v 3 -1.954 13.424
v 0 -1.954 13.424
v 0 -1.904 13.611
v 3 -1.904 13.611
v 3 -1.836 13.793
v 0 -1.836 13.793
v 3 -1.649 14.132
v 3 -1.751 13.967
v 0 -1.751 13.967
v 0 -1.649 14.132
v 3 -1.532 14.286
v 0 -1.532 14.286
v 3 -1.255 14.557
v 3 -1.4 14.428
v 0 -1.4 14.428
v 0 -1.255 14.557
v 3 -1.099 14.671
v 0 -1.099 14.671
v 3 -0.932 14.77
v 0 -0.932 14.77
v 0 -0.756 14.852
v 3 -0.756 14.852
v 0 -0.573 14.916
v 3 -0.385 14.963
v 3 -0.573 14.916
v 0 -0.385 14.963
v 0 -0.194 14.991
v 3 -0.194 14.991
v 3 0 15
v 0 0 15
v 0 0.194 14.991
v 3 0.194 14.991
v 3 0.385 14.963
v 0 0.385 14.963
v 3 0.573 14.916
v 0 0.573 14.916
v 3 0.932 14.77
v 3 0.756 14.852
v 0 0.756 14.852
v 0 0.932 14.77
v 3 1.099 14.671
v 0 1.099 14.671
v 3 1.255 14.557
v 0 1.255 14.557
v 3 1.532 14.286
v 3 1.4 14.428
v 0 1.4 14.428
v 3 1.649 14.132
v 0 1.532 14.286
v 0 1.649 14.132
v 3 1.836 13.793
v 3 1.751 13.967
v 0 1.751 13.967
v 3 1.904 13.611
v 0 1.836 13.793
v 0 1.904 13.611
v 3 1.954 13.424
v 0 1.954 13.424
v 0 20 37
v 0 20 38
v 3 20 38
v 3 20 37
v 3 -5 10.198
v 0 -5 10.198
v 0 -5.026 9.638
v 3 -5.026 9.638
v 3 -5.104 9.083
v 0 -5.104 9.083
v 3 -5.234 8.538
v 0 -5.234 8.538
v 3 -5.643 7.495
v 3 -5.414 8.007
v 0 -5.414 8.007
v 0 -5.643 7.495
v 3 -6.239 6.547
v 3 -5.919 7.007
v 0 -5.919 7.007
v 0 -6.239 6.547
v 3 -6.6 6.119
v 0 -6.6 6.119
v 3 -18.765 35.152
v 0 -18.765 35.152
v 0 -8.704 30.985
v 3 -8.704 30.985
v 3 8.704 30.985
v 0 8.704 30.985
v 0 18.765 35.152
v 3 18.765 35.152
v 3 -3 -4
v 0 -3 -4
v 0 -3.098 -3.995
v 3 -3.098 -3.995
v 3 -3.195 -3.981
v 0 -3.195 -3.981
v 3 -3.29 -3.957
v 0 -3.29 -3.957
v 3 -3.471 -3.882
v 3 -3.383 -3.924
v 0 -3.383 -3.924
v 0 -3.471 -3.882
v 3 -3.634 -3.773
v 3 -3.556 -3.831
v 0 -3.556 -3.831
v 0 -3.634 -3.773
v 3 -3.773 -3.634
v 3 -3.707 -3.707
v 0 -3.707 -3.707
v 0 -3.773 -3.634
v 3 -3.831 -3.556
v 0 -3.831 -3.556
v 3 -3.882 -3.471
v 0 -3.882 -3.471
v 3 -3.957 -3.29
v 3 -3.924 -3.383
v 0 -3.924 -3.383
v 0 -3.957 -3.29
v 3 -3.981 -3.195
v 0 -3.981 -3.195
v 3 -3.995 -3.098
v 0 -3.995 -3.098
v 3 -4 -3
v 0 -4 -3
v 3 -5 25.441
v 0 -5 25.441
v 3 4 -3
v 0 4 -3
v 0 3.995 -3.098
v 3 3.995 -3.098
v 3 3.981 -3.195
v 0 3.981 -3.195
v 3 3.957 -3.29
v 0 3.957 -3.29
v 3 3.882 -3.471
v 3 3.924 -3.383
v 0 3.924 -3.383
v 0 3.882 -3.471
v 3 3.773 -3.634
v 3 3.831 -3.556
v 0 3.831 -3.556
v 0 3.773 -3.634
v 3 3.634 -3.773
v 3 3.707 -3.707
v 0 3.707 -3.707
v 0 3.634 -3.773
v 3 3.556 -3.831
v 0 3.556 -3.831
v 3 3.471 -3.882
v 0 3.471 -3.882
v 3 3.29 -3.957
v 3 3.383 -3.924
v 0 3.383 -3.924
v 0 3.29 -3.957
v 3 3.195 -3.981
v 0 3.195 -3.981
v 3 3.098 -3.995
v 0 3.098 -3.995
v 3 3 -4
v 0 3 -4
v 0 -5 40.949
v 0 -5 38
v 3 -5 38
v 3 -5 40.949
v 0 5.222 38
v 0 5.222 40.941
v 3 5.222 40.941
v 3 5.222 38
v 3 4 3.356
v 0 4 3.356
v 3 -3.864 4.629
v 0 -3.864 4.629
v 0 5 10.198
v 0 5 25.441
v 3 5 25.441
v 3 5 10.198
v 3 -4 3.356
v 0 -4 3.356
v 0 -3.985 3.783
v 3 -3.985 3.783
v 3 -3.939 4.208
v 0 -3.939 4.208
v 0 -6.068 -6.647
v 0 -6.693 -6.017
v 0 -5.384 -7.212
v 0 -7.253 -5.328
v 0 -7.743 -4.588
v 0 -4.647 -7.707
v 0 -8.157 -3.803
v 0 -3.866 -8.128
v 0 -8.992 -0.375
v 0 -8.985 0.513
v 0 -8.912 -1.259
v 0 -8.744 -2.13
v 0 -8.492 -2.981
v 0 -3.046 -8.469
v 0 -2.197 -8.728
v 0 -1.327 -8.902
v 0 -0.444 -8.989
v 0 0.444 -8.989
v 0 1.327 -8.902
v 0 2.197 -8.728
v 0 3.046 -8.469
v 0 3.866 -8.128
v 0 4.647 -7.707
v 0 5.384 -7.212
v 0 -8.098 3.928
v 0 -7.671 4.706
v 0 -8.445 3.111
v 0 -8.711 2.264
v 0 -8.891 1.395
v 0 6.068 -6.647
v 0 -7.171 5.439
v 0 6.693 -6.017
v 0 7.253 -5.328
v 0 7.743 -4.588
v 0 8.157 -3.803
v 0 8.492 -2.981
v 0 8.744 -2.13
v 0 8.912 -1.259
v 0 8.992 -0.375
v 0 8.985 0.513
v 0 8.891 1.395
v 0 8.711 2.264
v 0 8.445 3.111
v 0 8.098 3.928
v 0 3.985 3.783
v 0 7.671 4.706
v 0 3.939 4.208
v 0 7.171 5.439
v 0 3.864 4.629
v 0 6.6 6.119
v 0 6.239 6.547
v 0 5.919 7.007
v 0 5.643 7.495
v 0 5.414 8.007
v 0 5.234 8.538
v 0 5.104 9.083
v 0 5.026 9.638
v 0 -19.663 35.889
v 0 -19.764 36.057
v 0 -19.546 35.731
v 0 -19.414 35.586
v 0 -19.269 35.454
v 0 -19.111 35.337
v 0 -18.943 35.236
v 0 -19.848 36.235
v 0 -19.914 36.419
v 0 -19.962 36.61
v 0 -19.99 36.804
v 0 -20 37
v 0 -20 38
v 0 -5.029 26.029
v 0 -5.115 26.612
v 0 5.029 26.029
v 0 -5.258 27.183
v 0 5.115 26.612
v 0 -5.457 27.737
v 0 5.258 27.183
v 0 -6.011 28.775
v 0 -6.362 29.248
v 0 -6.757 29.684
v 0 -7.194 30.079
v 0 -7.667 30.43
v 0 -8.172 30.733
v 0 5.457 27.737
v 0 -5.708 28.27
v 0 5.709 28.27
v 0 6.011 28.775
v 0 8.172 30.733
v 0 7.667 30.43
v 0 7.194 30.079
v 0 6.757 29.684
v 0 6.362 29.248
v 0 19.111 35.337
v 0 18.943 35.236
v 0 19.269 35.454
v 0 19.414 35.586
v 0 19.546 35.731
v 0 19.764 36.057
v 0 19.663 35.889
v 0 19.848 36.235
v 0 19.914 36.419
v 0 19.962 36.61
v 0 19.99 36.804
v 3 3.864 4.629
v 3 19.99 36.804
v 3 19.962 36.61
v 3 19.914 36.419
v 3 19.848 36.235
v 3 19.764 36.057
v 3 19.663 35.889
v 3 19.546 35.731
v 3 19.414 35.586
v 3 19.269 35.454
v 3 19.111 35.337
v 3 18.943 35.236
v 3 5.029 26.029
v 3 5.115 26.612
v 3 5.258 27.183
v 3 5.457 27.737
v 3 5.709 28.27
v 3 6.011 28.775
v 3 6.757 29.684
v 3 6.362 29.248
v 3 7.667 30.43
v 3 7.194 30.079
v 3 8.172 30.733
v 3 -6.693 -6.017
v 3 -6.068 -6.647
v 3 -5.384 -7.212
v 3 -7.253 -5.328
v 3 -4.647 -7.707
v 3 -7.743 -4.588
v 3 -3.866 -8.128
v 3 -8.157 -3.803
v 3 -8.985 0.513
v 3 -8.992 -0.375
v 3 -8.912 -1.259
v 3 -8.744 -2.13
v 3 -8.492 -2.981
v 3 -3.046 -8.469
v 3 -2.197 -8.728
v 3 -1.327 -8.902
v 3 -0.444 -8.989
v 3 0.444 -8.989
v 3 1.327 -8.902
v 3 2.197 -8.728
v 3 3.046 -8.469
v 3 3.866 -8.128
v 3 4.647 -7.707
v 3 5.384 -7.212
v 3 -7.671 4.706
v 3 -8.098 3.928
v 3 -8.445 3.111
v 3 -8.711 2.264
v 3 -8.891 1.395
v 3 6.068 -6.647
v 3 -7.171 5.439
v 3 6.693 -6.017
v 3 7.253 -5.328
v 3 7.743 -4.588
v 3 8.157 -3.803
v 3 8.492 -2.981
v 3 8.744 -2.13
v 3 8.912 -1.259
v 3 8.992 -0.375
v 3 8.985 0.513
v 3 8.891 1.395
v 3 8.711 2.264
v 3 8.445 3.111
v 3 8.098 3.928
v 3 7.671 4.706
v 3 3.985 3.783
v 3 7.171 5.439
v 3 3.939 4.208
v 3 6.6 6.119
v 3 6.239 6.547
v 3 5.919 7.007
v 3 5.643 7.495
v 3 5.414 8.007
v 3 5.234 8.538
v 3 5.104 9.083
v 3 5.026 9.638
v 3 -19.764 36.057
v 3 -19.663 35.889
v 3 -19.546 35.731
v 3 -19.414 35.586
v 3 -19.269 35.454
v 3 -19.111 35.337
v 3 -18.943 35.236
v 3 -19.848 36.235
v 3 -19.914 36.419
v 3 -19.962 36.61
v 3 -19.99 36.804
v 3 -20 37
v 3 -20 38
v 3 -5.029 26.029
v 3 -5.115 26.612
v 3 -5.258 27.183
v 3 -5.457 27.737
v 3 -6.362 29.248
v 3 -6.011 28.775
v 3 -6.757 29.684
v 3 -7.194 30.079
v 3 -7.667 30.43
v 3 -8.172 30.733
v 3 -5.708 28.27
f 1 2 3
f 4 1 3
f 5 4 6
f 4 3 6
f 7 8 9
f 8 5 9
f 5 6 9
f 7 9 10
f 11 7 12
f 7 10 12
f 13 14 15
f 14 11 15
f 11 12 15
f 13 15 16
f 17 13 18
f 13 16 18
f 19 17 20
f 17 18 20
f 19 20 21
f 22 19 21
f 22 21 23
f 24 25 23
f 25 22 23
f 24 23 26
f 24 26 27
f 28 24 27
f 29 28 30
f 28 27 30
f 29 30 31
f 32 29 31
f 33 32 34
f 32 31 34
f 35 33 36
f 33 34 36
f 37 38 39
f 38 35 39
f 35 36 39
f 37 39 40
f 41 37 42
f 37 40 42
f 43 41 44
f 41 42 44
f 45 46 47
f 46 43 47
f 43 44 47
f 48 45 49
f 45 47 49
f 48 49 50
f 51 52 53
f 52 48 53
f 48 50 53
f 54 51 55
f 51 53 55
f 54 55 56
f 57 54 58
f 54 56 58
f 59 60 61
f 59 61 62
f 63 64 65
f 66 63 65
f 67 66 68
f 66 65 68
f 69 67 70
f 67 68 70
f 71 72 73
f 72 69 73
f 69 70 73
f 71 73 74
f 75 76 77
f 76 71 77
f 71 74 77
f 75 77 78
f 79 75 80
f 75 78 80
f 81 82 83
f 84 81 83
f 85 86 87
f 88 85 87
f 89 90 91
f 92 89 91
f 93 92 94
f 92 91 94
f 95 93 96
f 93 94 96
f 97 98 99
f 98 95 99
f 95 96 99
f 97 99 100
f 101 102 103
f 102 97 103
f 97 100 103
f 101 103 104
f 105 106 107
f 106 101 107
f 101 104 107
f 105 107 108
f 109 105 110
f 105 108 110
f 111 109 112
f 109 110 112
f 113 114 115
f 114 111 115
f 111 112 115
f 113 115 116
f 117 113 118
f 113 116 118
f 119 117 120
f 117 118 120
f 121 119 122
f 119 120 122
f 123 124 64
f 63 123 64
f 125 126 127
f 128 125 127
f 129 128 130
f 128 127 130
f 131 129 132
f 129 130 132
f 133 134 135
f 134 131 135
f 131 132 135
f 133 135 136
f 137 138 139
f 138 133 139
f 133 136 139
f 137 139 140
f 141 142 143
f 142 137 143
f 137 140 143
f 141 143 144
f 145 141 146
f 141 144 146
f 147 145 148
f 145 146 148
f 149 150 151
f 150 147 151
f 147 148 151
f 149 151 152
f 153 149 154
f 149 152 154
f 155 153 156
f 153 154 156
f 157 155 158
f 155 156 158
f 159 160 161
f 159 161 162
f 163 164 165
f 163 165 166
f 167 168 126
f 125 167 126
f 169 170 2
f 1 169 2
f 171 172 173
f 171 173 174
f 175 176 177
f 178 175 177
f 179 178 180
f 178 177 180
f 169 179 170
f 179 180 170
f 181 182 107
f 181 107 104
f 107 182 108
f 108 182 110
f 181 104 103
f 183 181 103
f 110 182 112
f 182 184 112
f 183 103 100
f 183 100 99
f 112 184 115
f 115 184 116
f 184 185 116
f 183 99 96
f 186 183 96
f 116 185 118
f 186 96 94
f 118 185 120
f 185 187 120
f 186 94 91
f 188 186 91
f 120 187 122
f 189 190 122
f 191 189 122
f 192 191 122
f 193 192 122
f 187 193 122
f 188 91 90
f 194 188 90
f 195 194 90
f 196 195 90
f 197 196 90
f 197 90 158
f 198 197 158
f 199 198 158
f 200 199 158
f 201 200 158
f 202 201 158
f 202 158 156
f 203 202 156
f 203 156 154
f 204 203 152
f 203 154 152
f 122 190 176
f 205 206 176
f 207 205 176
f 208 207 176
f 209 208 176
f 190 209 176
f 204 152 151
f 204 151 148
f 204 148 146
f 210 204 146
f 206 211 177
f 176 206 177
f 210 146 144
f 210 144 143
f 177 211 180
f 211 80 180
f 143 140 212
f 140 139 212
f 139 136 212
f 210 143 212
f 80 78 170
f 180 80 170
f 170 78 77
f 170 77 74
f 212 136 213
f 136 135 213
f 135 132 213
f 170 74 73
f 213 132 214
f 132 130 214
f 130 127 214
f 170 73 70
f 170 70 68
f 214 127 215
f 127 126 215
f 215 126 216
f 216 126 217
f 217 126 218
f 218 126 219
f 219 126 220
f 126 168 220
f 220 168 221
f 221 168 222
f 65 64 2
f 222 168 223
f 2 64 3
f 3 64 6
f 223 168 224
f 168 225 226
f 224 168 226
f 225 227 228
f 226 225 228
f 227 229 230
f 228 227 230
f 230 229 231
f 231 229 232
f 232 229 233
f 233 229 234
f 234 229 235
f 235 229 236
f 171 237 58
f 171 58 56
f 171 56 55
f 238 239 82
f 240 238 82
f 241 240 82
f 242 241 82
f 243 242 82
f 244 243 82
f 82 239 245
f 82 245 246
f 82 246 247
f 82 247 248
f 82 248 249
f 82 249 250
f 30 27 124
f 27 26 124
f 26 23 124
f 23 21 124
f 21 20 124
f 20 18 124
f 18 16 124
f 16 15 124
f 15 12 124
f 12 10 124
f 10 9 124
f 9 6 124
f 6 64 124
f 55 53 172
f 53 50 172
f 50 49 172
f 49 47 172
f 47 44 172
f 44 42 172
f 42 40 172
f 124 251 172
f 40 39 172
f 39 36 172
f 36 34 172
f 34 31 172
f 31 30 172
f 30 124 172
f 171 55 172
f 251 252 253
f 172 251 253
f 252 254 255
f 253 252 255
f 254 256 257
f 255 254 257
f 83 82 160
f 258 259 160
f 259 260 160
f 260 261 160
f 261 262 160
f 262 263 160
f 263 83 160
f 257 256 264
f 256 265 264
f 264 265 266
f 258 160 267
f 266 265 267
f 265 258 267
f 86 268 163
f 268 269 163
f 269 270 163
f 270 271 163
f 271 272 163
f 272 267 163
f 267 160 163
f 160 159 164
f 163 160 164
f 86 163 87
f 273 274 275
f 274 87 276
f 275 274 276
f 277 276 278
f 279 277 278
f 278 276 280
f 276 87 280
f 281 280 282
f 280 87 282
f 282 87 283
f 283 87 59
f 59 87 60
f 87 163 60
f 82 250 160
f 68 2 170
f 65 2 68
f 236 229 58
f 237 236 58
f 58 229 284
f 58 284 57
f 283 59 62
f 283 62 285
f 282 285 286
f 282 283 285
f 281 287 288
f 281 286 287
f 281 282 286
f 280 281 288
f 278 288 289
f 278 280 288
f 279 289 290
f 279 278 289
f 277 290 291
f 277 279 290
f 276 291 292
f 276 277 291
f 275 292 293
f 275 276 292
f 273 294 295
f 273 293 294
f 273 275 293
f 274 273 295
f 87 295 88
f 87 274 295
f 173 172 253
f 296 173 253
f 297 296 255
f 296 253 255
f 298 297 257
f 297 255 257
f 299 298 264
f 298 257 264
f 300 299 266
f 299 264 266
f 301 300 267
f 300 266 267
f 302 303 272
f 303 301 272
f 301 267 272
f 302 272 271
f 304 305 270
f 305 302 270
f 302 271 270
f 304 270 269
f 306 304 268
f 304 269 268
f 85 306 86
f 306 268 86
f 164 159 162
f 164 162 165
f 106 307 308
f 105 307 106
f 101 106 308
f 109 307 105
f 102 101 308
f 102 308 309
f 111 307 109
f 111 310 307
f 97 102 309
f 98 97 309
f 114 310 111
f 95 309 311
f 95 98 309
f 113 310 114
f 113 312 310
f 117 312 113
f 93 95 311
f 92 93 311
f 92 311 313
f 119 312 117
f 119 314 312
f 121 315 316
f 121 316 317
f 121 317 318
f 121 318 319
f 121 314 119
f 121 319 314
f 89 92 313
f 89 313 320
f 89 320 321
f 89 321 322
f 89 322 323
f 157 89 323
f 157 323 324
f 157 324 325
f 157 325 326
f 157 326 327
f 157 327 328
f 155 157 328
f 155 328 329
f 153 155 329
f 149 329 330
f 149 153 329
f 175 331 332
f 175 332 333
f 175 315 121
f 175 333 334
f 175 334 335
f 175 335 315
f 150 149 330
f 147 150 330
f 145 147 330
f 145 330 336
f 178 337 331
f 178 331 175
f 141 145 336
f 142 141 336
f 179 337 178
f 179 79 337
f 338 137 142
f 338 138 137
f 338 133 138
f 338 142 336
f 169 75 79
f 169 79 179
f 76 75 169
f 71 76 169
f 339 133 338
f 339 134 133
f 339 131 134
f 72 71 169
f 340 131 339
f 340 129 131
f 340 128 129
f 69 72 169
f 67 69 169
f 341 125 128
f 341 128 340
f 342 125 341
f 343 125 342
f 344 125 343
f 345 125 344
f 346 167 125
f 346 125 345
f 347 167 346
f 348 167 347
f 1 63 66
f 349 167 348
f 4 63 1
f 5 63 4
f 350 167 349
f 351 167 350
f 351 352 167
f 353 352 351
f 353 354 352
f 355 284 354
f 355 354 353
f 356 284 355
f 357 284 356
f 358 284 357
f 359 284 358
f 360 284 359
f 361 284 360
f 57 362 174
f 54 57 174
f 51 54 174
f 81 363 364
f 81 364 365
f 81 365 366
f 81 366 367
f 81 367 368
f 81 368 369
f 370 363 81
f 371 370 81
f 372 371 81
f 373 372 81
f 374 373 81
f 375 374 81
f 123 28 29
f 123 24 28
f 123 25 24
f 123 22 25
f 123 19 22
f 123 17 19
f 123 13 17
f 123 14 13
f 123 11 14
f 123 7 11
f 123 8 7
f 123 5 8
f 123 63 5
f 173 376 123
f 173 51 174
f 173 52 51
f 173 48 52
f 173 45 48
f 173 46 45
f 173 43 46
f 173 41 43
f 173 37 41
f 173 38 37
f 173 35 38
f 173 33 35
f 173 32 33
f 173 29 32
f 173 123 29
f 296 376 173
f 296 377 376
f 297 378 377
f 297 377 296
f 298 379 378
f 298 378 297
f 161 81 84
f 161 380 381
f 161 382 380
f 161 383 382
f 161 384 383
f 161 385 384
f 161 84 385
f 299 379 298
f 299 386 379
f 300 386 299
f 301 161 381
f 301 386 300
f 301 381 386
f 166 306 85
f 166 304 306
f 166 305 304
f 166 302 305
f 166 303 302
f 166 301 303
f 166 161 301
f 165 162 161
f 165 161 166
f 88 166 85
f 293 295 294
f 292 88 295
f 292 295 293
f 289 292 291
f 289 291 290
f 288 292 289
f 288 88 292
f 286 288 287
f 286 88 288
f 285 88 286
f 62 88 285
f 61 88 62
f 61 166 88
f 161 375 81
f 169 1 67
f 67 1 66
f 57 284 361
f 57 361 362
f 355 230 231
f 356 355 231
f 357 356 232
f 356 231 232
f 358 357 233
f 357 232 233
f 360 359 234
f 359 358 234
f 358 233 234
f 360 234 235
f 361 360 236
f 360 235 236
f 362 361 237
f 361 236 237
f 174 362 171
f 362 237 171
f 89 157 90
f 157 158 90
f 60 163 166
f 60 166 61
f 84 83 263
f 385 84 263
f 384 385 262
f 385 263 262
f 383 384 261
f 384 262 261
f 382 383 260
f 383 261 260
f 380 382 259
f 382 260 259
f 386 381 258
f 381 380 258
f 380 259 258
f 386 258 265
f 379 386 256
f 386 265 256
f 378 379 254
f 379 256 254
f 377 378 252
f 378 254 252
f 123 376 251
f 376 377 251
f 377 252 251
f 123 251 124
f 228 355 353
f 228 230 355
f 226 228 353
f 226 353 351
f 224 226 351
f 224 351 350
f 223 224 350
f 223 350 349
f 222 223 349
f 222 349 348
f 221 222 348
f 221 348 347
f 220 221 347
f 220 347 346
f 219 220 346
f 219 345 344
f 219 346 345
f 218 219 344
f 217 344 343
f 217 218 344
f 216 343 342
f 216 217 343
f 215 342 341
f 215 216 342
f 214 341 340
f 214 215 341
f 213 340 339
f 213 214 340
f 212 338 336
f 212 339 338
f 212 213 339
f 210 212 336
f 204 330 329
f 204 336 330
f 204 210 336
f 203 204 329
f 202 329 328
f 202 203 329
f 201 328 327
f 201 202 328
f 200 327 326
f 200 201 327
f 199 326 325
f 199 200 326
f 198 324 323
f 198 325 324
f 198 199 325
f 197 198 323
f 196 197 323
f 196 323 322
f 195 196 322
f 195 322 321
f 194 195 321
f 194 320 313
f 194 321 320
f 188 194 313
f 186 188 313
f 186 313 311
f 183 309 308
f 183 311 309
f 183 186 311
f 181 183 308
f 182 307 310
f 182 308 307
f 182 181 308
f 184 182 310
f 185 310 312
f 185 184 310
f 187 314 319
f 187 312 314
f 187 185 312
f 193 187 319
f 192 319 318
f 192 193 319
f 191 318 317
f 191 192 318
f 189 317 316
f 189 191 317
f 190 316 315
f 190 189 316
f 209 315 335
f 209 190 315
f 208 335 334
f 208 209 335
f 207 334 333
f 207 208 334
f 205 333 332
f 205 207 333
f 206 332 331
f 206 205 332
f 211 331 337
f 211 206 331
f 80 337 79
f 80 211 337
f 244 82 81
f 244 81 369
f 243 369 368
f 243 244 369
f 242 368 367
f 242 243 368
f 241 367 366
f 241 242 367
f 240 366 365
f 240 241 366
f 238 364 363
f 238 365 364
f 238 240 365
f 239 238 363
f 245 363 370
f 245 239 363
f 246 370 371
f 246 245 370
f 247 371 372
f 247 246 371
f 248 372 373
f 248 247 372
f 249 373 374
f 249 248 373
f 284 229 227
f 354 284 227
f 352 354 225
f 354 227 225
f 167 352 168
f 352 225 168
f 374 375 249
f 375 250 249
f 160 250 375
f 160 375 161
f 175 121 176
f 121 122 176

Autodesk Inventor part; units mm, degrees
ref_plane "YZ Plane" through (0, 0, 0) normal (1, 0, 0) x (0, 1, 0)
ref_plane "XZ Plane" through (0, 0, 0) normal (0, 1, 0) x (-1, 0, 0)
ref_plane "XY Plane" through (0, 0, 0) normal (0, 0, 1) x (1, 0, 0)
sketch "Sketch1" plane through (0, 0, 0) normal (1, 0, 0) x (0, 1, 0)
  line L0 (-18.7654, 35.1522) -> (-8.7039, 30.9846)
  line L1 (8.7039, 30.9846) -> (18.7654, 35.1522)
  line L2 (-21, 41) -> (21, 41) construction
  line L3 (-5, 25.4414) -> (-5, 10.198)
  line L4 (5, 25.4414) -> (5, 10.198)
  arc A0 (-5, 25.4414) -> (-8.7039, 30.9846) centre (-11, 25.4414) ccw
  arc A1 (8.7039, 30.9846) -> (5, 25.4414) centre (11, 25.4414) ccw
  arc A2 (-6.6, 6.1188) -> (6.6, 6.1188) centre (0, 0) ccw
  arc A3 (-6.6, 6.1188) -> (-5, 10.198) centre (-11, 10.198) ccw
  arc A4 (5, 10.198) -> (6.6, 6.1188) centre (11, 10.198) ccw
  line L5 (4, 3.3563) -> (4, -3)
  line L6 (3, -4) -> (-3, -4)
  line L7 (-4, -3) -> (-4, 3.3563)
  line L8 (-4, 4) -> (4, -4) construction
  line L9 (4, 4) -> (-4, -4) construction
  arc A5 (1.9545, 13.4242) -> (-1.9545, 13.4242) centre (0, 13) ccw
  line L10 (0, 13) -> (0, 0) construction
  line L11 (-3.8635, 4.629) -> (-1.9545, 13.4242)
  line L12 (3.8635, 4.629) -> (1.9545, 13.4242)
  arc A6 (-3.8635, 4.629) -> (-4, 3.3563) centre (2, 3.3563) ccw
  arc A7 (4, 3.3563) -> (3.8635, 4.629) centre (-2, 3.3563) ccw
  arc A8 (-4, -3) -> (-3, -4) centre (-3, -3) ccw
  arc A9 (3, -4) -> (4, -3) centre (3, -3) ccw
  line L13 (-5, 38) -> (-5, 41)
  line L14 (5.2222, 41) -> (5.2222, 38)
  line L15 (-20, 38) -> (-5, 38)
  line L16 (5.2222, 38) -> (20, 38)
  line L17 (-20, 38) -> (-20, 37)
  line L18 (20, 38) -> (20, 37)
  circle A10 centre (0, 0) radius 46 construction
  arc A11 (-20, 37) -> (-18.7654, 35.1522) centre (-18, 37) ccw
  arc A12 (18.7654, 35.1522) -> (20, 37) centre (18, 37) ccw
  line L19 (-5, 40.9488) -> (5.2222, 40.9409)
  point P0 (-5, 29.4504)
  point P1 (5, 29.4504)
  point P2 (-5, 7.4833)
  point P3 (5, 7.4833)
  point P4 (0, 0)
  dimension "d25" = 10
  dimension "d32" = 6
  dimension "d33" = 6
  dimension "d68" = 18
  dimension "d69" = 6
  dimension "d75" = 8
  dimension "d76" = 8
  dimension "d77" = 4
  dimension "d78" = 13
  dimension "d79" = 6
  dimension "d80" = 1
  dimension "d82" = 46
  dimension "d84" = 38
  dimension "d85" = 3
  dimension "d86" = 5
  dimension "d87" = 20
  dimension "d88" = 40
  dimension "d90" = 2
  dimension "d93" = 1
  dimension "d94" = 1
  dimension "d95" = 22.5
  dimension "d96" = 22.5
  dimension "d97" = 4
  dimension "d98" = 4
extrude "Extrusion6" add sketch "Sketch1" along normal blind 3
properties part number "Camera Mount_B073113"
